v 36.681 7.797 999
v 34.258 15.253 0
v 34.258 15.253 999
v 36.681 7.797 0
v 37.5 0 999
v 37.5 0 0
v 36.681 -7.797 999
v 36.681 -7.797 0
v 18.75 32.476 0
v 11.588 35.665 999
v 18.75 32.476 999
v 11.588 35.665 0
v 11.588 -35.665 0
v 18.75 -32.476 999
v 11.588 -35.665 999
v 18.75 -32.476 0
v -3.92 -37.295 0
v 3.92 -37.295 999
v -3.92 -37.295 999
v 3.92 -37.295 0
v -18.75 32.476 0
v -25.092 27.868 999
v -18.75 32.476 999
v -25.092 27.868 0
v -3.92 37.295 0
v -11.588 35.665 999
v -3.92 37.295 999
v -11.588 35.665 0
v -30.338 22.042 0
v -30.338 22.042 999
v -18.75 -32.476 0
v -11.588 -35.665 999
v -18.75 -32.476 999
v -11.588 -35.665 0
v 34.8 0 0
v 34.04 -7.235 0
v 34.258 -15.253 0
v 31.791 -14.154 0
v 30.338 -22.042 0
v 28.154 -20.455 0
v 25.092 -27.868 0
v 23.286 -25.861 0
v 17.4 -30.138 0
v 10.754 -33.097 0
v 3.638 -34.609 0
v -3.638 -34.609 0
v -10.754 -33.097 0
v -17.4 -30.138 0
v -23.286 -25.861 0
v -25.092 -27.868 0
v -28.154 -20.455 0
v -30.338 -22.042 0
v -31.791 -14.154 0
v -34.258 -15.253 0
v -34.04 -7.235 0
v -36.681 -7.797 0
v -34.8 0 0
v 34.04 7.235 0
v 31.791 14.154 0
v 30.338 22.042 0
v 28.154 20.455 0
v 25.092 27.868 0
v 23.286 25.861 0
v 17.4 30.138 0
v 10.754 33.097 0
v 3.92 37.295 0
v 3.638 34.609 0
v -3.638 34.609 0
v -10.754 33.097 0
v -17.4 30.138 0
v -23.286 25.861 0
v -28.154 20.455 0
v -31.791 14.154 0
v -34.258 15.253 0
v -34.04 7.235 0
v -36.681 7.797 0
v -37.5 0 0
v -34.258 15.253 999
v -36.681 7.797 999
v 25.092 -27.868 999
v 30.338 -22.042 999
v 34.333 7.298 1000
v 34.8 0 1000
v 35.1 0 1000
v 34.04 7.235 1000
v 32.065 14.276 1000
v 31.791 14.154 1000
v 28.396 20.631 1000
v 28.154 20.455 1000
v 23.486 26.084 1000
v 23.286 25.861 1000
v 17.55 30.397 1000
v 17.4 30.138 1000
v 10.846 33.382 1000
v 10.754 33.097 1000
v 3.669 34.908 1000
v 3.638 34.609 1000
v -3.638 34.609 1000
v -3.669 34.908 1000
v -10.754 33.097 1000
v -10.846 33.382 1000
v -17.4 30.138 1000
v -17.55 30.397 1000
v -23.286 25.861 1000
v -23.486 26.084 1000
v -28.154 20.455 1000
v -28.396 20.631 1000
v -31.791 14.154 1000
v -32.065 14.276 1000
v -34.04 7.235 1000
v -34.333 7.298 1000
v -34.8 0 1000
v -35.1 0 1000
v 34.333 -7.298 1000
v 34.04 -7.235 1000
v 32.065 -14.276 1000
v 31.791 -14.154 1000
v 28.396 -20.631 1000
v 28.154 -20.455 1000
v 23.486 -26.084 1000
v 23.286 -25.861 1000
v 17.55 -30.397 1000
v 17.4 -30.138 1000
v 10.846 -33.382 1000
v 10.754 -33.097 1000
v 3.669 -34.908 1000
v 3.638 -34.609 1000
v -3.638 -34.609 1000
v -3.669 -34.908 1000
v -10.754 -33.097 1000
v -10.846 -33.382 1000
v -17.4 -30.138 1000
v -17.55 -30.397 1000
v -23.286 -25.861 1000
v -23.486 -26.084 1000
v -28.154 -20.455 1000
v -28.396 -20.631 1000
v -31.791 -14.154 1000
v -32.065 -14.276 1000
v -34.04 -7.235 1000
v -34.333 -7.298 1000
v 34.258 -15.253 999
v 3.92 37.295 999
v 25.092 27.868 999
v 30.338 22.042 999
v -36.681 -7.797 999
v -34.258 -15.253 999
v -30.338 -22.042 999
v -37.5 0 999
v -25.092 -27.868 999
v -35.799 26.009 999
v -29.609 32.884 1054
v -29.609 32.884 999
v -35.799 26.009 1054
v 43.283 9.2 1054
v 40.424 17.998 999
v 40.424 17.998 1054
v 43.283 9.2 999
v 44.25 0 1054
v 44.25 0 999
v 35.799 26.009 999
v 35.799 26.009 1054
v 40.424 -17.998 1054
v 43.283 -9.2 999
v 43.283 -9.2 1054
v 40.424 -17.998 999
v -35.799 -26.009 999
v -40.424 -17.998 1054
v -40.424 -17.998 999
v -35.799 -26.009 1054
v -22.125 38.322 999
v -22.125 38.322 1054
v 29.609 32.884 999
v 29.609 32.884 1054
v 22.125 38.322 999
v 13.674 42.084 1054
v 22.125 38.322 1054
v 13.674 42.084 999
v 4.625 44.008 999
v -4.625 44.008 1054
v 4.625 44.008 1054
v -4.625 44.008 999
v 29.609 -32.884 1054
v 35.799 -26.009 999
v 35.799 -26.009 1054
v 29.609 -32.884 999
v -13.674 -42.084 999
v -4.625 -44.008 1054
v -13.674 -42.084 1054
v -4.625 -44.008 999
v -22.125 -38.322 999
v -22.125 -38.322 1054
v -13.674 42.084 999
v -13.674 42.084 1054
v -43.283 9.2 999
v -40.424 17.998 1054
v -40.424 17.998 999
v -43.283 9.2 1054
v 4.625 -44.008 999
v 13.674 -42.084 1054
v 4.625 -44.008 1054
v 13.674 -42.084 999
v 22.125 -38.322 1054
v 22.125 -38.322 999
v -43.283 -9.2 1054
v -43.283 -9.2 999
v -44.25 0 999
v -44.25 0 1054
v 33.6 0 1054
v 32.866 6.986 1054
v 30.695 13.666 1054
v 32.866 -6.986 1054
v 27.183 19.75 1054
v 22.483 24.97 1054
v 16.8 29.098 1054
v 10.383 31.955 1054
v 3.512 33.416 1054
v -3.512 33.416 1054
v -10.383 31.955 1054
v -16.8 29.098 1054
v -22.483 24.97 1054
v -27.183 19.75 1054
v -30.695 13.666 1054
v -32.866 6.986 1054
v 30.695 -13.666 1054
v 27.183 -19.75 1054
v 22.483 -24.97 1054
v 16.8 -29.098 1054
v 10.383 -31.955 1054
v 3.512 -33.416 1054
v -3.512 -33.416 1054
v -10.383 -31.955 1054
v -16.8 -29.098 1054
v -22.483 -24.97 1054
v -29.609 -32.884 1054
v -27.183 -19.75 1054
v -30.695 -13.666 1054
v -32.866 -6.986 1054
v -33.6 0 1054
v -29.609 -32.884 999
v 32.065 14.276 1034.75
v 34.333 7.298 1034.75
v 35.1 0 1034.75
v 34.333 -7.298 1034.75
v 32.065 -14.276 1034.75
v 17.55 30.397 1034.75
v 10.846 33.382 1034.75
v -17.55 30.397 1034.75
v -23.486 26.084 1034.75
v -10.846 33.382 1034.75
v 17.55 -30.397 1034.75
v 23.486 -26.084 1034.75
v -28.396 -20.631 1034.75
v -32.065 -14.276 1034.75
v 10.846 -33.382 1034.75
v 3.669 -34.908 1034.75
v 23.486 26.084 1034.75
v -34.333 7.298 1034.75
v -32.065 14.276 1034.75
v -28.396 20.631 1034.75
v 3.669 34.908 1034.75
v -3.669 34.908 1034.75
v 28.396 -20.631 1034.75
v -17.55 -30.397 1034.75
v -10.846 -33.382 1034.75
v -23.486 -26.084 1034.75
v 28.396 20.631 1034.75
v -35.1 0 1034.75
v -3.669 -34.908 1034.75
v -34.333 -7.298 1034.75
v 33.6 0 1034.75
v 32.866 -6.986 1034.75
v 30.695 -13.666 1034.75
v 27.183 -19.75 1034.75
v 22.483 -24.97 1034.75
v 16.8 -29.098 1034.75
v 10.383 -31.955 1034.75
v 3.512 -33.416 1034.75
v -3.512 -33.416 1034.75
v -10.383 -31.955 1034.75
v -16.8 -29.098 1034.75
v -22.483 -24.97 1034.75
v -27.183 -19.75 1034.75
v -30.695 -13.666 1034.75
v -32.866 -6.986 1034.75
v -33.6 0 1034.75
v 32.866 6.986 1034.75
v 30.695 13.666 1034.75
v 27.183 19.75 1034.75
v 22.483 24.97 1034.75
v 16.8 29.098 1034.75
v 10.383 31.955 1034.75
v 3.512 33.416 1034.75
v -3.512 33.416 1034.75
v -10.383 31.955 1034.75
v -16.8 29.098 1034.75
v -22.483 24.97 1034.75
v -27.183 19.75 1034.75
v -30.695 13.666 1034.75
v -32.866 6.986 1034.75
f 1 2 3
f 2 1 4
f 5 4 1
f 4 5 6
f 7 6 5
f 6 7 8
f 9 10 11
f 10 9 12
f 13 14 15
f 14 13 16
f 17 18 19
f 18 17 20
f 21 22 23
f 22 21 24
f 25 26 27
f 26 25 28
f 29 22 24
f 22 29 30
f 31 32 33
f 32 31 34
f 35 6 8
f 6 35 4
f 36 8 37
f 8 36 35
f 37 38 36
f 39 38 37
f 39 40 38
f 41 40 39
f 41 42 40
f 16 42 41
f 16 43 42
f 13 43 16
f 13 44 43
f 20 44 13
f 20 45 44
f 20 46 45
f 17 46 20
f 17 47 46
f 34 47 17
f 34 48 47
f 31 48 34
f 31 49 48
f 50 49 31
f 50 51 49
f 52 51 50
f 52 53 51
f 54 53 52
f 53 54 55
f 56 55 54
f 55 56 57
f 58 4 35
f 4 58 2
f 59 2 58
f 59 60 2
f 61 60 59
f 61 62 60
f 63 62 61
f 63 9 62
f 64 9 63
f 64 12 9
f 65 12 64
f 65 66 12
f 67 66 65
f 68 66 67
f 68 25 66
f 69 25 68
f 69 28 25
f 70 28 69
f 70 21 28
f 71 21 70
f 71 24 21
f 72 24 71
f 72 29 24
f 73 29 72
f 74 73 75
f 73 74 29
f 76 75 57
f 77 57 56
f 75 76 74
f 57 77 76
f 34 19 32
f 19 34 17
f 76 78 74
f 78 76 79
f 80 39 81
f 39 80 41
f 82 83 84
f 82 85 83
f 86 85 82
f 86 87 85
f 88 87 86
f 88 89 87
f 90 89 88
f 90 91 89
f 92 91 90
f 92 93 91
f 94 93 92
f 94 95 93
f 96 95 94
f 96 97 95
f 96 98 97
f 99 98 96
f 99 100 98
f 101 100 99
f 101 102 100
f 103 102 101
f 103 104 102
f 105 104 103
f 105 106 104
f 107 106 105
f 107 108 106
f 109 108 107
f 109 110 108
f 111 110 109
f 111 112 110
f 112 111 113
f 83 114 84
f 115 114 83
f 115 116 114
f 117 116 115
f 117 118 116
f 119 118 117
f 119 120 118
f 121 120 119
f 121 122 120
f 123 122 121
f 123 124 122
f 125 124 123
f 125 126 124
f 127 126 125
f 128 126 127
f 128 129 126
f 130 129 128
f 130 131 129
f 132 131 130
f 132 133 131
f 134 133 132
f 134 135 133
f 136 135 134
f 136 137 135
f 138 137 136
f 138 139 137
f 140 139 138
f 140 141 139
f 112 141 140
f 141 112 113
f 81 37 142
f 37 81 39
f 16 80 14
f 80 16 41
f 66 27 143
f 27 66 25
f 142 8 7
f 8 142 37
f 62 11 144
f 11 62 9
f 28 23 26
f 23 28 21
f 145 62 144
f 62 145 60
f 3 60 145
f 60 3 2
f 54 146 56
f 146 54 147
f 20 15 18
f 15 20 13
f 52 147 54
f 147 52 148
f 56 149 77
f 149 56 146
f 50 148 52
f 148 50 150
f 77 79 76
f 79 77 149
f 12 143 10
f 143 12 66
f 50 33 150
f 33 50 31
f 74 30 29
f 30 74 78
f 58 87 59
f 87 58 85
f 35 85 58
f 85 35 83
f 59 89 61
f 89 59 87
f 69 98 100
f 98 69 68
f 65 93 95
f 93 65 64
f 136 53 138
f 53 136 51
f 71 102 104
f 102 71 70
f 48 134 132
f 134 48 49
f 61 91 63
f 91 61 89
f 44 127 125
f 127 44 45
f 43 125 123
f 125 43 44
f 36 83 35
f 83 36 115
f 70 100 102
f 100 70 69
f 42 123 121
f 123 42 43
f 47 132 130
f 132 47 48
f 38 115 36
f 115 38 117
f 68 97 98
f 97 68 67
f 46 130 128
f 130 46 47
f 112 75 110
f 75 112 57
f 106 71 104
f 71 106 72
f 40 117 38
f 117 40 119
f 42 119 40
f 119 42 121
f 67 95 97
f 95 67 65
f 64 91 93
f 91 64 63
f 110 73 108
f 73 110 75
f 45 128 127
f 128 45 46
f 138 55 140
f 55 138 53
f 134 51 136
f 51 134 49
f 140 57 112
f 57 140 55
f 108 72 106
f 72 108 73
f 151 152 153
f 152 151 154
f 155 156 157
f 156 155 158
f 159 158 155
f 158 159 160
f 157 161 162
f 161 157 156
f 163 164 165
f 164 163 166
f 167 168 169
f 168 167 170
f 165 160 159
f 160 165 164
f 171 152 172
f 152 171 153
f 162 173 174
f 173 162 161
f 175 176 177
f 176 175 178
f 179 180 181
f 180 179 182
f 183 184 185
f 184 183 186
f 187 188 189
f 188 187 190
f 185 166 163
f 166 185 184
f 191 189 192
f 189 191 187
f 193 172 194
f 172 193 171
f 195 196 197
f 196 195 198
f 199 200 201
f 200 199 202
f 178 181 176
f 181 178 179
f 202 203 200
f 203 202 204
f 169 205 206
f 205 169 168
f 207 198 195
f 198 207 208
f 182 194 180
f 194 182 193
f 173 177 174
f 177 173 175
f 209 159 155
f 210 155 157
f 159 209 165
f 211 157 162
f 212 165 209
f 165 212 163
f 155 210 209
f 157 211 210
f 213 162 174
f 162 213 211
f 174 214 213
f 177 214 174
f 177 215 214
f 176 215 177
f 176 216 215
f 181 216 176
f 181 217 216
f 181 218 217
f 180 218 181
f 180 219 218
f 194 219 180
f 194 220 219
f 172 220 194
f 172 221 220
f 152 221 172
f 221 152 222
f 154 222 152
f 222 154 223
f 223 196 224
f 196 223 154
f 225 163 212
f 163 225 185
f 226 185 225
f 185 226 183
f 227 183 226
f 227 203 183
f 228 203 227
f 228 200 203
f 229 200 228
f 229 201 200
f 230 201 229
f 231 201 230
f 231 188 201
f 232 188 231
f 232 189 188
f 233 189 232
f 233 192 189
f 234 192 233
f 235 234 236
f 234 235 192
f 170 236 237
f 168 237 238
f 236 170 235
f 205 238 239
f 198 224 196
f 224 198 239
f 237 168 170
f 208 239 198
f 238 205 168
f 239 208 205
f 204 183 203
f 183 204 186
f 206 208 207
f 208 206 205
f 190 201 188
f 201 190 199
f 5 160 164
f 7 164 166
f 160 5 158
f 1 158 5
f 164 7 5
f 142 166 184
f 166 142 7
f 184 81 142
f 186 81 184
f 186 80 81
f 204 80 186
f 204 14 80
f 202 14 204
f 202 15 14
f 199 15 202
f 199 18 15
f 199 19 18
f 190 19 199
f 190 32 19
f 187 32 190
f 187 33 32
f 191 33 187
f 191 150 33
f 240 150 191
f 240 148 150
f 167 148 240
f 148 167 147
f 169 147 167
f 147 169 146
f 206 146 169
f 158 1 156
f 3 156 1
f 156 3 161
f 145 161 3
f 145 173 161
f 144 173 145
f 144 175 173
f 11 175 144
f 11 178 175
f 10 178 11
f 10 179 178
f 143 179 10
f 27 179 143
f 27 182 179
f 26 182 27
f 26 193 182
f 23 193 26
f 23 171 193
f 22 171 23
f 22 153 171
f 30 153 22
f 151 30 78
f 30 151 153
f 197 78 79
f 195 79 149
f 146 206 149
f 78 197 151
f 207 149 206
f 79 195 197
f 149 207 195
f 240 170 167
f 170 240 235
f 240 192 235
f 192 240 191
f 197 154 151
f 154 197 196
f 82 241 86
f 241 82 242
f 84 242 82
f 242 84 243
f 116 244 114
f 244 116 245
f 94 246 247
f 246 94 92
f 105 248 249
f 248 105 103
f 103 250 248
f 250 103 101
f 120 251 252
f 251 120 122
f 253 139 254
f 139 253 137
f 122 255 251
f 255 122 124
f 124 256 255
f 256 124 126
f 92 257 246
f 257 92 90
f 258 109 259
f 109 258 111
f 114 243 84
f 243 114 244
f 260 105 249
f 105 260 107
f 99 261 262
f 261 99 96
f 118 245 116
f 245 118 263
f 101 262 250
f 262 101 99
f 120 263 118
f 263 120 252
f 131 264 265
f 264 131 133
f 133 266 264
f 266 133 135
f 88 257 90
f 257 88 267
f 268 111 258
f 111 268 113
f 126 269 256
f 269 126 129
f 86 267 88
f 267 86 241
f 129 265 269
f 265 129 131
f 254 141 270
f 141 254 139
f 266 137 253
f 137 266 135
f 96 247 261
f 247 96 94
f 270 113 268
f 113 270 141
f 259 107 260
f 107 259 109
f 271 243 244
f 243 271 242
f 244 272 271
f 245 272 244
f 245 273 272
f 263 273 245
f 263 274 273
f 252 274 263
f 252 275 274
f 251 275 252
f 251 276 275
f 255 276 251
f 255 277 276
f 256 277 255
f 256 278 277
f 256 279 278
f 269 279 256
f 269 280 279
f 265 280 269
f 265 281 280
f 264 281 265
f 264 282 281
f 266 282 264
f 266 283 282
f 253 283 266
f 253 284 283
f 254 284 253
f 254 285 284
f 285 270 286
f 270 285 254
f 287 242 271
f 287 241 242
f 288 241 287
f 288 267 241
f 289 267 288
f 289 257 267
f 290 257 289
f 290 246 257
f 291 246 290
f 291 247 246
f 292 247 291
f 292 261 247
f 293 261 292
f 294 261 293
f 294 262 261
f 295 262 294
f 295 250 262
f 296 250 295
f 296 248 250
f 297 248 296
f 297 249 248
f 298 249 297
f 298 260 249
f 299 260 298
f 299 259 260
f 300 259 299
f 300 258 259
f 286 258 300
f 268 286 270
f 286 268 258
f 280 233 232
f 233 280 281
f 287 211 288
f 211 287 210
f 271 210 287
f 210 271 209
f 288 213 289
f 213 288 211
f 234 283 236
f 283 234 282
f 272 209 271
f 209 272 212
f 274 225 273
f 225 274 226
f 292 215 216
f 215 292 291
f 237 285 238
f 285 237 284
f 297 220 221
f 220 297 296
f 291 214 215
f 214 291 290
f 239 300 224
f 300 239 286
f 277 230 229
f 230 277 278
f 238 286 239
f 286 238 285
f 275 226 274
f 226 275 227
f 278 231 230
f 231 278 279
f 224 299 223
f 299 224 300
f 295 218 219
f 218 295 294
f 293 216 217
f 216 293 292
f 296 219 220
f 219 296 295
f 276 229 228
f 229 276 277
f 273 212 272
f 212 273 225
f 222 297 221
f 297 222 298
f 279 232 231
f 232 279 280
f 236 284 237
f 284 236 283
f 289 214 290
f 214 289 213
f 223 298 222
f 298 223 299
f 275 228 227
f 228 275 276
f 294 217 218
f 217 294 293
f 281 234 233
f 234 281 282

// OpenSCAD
// Parameters
length_mm = 1000; //[500:2000:10]
pipe_od_mm = 75; //[60:90:1]
wall_thickness_mm = 2.7; //[1.5:5.4:0.1]
include_end_fitting = 1; //[0:1:1]
fitting_length_mm = 55; //[30:110:1]
fitting_od_scale = 1.18; //[1.05:1.4:0.01]
fitting_wall_extra_mm = 1.2; //[0.5:3:0.1]
fitting_overlap_mm = 1; //[0.5:2:0.1]
inner_clearance_mm = 0.3; //[0:1:0.1]

// HT Pipe - complete geometry
module ht_pipe() {
  color([0.85, 0.85, 0.8]) { // PVC color
    // Pipe body
    difference() {
      cylinder(h=length_mm, r=pipe_od_mm/2, center=false);
      translate([0, 0, 0])
        cylinder(h=length_mm, r=pipe_od_mm/2 - wall_thickness_mm, center=false);
    }
    
    if (include_end_fitting) {
      // End fitting main shell
      difference() {
        translate([0, 0, length_mm - fitting_overlap_mm])
          cylinder(h=fitting_length_mm, r=(pipe_od_mm*fitting_od_scale)/2, center=false);
        translate([0, 0, length_mm - fitting_overlap_mm])
          cylinder(h=fitting_length_mm, r=pipe_od_mm/2 - wall_thickness_mm + inner_clearance_mm, center=false);
      }
      
      // End fitting step shell
      difference() {
        translate([0, 0, length_mm - fitting_overlap_mm + fitting_length_mm*0.65])
          cylinder(h=fitting_length_mm*0.35, r=(pipe_od_mm*(fitting_od_scale - 0.06))/2, center=false);
        translate([0, 0, length_mm - fitting_overlap_mm + fitting_length_mm*0.65])
          cylinder(h=fitting_length_mm*0.35, r=pipe_od_mm/2 - (wall_thickness_mm + fitting_wall_extra_mm), center=false);
      }
    }
  }
}

// Assembly
module assembly() {
  ht_pipe();
}

assembly();
